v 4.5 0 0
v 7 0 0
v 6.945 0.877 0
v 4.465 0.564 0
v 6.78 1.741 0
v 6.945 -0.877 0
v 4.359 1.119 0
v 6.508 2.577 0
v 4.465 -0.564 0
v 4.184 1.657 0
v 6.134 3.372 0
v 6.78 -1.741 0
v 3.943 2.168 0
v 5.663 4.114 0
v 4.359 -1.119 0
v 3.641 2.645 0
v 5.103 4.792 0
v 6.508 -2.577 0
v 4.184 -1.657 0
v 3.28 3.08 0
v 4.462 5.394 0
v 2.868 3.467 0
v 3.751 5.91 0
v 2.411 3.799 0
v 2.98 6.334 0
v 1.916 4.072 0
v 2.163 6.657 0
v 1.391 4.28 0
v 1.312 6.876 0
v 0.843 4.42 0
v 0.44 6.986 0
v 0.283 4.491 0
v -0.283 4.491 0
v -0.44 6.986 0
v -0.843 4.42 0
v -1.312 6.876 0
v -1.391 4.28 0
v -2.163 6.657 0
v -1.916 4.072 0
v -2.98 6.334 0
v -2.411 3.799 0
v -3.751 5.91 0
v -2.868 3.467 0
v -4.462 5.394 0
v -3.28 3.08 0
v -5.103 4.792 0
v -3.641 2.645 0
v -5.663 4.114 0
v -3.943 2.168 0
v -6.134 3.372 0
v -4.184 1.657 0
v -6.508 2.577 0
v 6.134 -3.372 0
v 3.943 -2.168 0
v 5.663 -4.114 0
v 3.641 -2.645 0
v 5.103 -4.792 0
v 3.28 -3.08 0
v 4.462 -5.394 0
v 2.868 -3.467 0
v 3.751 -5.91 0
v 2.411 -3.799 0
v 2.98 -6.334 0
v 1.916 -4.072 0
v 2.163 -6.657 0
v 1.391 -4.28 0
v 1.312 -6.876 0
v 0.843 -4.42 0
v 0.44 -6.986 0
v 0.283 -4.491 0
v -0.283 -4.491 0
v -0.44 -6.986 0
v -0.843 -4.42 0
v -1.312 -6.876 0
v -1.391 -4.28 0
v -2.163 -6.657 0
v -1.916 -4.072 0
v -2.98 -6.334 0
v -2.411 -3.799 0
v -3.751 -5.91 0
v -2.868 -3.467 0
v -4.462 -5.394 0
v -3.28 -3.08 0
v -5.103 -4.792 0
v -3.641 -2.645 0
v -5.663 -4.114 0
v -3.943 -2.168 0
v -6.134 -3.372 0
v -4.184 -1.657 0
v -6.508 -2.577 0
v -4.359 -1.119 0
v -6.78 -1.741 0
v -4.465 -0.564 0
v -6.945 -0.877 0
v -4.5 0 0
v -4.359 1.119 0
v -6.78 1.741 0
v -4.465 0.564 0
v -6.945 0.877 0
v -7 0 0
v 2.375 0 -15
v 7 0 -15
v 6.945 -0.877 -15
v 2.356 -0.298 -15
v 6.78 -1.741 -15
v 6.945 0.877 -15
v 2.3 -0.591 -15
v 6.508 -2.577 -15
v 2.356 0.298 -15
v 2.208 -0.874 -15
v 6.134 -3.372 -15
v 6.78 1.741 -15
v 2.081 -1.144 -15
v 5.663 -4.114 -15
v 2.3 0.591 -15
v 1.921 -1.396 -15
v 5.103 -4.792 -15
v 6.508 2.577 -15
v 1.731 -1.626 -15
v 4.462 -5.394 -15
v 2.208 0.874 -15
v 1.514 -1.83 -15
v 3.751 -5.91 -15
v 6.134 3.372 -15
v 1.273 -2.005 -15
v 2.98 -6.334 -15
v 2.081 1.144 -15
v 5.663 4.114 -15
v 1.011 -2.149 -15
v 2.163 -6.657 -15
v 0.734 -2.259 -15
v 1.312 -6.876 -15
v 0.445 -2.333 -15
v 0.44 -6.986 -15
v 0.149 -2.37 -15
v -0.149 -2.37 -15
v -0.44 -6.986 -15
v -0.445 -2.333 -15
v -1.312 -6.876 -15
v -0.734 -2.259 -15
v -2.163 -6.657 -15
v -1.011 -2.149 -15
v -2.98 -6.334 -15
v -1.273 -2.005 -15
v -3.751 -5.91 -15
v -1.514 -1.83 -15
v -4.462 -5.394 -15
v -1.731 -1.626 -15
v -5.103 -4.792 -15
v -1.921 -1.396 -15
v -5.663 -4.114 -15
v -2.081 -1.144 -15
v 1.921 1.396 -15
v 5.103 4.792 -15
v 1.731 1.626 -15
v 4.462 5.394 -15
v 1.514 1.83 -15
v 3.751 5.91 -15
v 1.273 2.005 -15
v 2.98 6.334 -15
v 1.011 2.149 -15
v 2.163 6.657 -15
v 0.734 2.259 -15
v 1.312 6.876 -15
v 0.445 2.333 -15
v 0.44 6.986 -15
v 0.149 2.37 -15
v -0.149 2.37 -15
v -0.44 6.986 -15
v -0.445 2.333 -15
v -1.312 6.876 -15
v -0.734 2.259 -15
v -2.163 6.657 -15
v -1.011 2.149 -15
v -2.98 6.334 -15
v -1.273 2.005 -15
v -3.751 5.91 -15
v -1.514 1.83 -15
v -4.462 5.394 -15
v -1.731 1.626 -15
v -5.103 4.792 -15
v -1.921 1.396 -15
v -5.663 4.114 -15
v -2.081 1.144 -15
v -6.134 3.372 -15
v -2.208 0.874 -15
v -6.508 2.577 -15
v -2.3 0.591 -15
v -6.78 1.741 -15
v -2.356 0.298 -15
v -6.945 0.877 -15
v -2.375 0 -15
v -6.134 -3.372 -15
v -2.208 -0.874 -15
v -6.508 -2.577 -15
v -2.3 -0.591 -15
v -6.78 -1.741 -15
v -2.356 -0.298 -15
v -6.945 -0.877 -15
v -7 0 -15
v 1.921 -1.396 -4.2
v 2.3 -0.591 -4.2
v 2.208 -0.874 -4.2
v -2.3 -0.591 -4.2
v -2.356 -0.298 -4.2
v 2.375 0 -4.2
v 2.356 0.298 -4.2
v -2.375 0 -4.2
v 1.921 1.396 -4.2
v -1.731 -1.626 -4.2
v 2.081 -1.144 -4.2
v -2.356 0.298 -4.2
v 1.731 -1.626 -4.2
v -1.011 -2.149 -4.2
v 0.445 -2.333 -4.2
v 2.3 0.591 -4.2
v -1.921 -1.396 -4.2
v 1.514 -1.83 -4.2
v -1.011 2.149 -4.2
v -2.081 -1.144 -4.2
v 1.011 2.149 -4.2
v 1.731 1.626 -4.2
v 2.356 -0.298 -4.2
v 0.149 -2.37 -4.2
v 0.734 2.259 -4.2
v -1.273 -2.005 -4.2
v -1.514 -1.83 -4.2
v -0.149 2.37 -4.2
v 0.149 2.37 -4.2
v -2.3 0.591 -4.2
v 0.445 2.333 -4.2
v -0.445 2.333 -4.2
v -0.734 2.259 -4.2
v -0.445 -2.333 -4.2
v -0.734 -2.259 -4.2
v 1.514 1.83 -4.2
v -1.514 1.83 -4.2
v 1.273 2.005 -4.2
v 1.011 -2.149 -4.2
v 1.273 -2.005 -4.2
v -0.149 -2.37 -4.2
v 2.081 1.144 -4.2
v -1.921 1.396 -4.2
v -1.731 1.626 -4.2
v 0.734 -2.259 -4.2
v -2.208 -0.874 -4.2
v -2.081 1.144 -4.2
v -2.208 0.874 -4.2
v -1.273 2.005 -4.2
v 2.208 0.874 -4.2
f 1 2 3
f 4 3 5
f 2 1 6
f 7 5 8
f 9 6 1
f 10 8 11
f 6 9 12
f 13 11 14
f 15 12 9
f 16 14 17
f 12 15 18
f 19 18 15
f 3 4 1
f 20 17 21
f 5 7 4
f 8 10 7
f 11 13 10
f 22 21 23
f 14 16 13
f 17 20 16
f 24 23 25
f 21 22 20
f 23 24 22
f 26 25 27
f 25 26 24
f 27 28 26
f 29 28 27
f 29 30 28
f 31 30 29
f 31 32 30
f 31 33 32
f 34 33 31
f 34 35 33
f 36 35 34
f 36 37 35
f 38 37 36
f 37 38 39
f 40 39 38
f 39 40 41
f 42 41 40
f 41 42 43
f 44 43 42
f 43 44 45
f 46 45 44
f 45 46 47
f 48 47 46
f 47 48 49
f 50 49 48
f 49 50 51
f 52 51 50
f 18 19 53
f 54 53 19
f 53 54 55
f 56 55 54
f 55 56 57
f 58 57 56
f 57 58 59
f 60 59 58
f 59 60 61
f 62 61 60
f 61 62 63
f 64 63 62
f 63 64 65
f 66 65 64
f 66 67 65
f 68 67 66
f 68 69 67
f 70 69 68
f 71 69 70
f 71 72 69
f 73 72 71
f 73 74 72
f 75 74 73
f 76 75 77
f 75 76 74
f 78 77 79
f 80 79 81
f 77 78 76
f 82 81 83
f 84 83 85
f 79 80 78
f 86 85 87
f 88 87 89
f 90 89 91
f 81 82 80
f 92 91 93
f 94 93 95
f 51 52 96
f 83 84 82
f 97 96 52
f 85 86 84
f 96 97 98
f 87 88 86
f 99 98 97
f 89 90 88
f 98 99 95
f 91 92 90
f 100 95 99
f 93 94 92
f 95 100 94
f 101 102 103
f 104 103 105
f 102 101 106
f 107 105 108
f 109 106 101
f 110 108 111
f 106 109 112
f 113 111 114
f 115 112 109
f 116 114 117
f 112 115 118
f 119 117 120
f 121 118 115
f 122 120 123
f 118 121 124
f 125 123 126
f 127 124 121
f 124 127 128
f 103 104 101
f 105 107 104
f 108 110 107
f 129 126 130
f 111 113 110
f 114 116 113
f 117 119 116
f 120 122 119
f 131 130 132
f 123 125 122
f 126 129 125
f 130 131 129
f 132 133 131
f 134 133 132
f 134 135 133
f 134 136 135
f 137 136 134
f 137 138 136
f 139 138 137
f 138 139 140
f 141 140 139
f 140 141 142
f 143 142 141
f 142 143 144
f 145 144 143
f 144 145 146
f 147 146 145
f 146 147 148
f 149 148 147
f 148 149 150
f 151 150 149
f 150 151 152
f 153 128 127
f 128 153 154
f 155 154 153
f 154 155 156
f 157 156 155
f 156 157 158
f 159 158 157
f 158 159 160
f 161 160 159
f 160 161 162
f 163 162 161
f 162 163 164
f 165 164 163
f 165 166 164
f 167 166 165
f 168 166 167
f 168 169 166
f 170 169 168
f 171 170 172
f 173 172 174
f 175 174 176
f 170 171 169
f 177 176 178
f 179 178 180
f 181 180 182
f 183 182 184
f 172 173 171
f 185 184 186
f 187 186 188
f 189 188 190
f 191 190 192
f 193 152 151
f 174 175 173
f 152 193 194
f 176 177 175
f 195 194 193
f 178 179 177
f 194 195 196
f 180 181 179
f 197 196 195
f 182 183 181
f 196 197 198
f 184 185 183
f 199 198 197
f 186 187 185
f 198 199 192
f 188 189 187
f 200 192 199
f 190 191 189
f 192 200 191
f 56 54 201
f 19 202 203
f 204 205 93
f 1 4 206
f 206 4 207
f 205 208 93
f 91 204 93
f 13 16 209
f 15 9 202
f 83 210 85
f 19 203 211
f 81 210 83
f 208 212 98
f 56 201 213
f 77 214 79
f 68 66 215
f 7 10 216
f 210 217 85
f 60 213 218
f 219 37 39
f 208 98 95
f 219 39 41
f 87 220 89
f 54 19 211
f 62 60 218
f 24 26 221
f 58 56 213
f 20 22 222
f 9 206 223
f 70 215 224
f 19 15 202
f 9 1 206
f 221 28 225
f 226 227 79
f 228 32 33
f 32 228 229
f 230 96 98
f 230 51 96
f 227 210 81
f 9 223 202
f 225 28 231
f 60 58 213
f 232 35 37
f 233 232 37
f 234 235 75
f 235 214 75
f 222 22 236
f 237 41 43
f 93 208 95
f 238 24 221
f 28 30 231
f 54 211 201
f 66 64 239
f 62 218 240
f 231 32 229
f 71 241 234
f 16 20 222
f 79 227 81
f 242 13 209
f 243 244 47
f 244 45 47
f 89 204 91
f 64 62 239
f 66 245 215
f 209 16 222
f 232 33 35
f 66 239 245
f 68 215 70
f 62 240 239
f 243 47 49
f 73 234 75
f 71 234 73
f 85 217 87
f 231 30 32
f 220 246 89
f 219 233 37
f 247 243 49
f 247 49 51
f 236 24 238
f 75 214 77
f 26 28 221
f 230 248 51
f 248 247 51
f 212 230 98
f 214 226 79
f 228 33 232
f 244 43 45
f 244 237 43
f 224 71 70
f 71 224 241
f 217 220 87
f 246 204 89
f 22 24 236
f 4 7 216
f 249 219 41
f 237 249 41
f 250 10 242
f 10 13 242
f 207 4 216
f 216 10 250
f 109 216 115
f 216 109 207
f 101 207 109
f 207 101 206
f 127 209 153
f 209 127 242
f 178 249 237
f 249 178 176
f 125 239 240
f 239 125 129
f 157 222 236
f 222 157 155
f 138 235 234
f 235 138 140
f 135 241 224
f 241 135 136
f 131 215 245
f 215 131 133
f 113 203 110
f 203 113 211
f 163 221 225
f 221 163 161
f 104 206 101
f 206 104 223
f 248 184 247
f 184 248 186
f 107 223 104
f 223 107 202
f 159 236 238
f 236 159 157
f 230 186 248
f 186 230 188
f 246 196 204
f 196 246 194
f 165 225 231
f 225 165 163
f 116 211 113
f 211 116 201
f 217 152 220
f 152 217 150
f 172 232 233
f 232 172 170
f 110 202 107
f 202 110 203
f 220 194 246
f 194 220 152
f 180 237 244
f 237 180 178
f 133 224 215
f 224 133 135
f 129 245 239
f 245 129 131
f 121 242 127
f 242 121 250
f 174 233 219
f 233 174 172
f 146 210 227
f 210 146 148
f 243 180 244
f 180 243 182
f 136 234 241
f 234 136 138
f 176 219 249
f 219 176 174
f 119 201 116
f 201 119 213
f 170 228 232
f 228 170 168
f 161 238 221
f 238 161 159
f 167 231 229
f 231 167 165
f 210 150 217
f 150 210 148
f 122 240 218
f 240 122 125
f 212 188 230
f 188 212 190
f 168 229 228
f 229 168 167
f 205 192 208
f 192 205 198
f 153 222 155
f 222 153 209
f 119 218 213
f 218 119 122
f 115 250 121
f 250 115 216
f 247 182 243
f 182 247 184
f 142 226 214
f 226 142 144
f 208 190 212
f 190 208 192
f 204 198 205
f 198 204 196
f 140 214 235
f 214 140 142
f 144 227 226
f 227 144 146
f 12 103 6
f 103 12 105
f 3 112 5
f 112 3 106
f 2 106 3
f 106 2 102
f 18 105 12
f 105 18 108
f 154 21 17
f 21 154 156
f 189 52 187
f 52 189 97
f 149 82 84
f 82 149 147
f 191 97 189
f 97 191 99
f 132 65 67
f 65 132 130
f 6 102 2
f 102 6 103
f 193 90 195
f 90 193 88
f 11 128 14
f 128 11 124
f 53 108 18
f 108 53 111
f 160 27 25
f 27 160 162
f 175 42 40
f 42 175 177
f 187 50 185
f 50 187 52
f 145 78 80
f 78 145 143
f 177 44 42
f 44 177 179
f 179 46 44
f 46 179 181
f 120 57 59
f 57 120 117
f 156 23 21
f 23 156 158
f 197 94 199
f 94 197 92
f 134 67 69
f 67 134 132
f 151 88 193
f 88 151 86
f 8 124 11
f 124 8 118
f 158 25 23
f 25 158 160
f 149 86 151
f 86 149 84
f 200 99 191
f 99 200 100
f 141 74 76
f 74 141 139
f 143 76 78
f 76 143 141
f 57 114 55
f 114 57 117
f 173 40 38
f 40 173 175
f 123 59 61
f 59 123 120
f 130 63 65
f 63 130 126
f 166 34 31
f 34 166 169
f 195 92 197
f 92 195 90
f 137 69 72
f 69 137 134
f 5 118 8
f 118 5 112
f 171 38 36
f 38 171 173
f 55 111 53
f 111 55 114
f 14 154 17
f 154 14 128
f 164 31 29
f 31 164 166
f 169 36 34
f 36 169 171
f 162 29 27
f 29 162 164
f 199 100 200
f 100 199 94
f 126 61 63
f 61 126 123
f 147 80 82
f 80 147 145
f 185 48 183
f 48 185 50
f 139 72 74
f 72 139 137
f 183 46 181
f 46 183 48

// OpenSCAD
$fn = 50;


difference() {
	union() {
		translate(v = [0, 0, -15.0000000000]) {
			cylinder(h = 15, r = 7.0000000000);
		}
		cylinder(h = 0, r = 16.0000000000);
	}
	union() {
		translate(v = [0, 0, 0]) {
			rotate(a = [0, 0, 0]) {
				difference() {
					union() {
						#translate(v = [0, 0, -15.0000000000]) {
							cylinder(h = 15, r = 2.2500000000);
						}
						#translate(v = [0, 0, -4.2000000000]) {
							cylinder(h = 4.2000000000, r = 7.0000000000, r1 = 2.3750000000, r2 = 4.5000000000);
						}
						#translate(v = [0, 0, -15.0000000000]) {
							cylinder(h = 15, r = 2.3750000000);
						}
						#translate(v = [0, 0, -15.0000000000]) {
							cylinder(h = 15, r = 2.2500000000);
						}
					}
					union();
				}
			}
		}
	}
}
